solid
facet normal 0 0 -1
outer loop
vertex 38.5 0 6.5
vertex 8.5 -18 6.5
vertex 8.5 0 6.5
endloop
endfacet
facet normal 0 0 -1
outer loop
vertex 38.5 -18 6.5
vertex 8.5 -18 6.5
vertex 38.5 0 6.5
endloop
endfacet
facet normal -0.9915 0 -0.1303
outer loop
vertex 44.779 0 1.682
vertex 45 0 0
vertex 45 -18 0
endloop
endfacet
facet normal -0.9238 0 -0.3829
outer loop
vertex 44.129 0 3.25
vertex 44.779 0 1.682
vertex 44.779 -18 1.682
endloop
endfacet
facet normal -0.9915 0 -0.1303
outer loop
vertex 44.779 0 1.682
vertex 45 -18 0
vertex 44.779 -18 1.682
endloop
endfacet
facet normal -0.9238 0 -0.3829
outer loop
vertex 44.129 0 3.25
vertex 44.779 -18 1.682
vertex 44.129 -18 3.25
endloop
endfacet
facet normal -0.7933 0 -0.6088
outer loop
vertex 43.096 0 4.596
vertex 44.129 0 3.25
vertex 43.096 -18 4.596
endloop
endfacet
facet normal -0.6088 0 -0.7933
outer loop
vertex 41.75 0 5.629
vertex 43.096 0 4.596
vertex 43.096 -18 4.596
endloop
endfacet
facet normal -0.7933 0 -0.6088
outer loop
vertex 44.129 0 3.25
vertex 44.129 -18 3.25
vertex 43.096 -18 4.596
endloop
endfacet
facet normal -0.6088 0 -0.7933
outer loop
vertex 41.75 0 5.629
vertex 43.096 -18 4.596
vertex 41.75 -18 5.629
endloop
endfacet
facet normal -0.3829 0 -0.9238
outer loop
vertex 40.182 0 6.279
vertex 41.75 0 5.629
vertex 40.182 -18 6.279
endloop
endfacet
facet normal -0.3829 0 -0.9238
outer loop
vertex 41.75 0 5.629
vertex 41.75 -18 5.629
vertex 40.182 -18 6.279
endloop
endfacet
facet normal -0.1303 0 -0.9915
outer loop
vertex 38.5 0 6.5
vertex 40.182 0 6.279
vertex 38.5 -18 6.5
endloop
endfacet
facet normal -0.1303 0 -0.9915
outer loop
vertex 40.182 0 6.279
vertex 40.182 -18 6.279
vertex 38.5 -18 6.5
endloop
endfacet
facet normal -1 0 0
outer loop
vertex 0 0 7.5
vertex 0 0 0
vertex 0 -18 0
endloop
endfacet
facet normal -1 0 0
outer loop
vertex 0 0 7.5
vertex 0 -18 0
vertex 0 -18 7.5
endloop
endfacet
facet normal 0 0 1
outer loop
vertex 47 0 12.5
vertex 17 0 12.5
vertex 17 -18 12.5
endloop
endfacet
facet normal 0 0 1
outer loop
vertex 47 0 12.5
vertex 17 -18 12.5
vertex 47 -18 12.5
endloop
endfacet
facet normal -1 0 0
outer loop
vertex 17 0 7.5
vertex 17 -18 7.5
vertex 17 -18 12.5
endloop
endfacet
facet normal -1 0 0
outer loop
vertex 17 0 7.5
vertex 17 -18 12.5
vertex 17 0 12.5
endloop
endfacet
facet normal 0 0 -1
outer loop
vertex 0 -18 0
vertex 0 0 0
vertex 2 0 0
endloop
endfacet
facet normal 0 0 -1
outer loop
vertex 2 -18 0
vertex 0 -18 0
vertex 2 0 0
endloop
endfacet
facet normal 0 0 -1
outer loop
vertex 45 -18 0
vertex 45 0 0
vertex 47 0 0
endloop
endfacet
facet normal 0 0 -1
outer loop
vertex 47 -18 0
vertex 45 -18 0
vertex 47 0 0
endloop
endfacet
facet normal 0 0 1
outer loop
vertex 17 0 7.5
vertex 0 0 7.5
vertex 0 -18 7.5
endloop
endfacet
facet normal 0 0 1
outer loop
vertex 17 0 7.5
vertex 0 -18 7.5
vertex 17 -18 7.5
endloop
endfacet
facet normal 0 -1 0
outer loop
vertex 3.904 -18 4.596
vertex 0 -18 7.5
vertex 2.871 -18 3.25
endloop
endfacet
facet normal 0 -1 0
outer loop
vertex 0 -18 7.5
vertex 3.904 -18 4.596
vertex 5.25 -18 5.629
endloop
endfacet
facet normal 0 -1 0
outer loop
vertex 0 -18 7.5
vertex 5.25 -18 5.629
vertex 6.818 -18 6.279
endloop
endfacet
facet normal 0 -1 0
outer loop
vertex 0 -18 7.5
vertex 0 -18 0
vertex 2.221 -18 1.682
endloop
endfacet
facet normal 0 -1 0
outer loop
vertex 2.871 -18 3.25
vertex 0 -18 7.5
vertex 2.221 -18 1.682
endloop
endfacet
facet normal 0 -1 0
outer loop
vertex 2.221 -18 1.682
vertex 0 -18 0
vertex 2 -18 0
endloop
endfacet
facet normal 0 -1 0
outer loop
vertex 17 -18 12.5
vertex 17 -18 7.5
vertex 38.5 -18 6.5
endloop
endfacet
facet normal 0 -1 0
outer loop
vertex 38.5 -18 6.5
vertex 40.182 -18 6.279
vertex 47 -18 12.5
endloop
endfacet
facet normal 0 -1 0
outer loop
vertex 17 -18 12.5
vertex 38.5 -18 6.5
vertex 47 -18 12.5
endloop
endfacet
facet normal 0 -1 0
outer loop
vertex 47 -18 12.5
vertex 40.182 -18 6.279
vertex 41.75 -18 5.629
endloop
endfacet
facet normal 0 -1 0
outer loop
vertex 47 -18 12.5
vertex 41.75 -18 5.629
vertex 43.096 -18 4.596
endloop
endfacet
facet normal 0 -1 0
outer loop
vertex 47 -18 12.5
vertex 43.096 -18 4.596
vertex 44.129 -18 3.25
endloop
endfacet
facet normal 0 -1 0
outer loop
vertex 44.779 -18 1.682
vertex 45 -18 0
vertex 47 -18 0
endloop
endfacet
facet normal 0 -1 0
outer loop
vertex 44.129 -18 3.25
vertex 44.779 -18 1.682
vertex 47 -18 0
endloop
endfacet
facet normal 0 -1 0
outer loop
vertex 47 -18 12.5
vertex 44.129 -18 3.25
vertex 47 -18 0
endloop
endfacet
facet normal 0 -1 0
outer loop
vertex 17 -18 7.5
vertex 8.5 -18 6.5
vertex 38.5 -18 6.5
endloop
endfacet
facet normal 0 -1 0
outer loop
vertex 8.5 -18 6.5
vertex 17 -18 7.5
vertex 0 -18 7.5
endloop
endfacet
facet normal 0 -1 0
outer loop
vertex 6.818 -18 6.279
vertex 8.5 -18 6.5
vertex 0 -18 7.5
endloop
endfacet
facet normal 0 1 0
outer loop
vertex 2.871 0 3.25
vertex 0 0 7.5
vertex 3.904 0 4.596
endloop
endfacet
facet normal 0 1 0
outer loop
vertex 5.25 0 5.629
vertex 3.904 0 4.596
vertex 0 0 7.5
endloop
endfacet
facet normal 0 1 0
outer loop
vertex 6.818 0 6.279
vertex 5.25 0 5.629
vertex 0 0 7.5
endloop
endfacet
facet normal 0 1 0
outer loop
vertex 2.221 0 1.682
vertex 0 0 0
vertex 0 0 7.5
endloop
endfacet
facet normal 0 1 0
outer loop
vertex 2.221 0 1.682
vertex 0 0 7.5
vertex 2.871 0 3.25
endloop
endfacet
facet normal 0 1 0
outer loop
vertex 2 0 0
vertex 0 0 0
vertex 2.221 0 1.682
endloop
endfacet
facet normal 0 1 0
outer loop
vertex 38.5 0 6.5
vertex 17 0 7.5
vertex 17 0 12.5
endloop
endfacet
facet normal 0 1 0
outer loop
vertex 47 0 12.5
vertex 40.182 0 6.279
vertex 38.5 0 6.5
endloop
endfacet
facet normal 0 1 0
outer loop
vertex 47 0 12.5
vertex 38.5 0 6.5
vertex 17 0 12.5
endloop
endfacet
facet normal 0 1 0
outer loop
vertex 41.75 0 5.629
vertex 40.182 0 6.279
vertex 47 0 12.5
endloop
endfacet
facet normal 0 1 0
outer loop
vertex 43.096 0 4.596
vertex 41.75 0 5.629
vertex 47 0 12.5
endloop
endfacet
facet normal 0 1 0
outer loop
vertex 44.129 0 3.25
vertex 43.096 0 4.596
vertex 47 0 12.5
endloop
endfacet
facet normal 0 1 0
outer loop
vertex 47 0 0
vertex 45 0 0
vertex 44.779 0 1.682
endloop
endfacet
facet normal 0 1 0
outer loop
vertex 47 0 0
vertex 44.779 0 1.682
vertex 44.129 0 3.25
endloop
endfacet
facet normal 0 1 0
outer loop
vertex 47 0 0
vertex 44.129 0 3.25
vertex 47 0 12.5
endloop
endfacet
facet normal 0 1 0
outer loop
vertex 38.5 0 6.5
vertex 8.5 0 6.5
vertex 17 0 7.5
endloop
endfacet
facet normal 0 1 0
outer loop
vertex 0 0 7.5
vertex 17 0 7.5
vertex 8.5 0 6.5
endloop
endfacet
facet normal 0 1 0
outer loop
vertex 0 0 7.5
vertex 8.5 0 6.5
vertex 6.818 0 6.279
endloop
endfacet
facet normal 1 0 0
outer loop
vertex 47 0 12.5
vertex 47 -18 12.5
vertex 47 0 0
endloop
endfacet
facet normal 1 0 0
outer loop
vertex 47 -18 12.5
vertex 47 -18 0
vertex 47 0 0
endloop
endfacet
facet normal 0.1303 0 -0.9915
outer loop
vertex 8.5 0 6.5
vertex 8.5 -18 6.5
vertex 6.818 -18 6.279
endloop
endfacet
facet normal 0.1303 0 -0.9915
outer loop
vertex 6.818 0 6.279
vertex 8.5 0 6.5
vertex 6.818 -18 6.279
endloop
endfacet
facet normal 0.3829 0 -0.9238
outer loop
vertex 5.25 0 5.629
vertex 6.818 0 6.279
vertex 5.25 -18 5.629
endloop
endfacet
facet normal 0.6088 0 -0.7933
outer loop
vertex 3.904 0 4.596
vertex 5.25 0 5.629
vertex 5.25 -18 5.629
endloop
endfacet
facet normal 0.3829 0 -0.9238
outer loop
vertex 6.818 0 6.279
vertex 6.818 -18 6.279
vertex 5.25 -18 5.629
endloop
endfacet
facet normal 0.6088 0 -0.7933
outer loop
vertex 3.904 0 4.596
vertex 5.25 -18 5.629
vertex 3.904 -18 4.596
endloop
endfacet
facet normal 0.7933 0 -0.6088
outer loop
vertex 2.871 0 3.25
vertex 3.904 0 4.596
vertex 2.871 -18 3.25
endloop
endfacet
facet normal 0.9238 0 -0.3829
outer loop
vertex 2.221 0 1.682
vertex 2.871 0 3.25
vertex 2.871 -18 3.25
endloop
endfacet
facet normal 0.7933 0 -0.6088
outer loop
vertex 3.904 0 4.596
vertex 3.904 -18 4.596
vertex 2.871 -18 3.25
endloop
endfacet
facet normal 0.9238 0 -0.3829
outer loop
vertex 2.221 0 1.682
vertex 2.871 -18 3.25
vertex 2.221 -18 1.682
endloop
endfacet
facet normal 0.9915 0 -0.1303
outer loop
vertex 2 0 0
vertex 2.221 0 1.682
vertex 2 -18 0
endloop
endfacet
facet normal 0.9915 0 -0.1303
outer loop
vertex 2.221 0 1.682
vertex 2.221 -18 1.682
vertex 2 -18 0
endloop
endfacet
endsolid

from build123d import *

# Parameters (mm, degrees)
F0_W     = 47
F0_H     = 7.5
F1_DEPTH = 18
F2_W     = 30
F2_H     = 6.5
F3_DEPTH = 25
F4_R     = 6.5
F5_DEPTH = 25
F6_R     = 6.5
F7_DEPTH = 25
F8_W     = 30
F8_H     = 18
F9_DEPTH = 5


with BuildPart() as f1:
    # F0 (on Front) → F1 (new body)
    with BuildSketch(Plane.XZ):
        with Locations((23.5, 3.75)):
            Rectangle(F0_W, F0_H)
    extrude(amount=F1_DEPTH)

    # F2 (on face) → F3 (cut)
    with BuildSketch(Plane.XZ.offset(18)):
        with Locations((23.5, 3.25)):
            Rectangle(F2_W, F2_H)
    extrude(amount=-F3_DEPTH, mode=Mode.SUBTRACT)

    # F4 (on face) → F5 (cut)
    with BuildSketch(Plane.XZ.offset(18)):
        with Locations((8.5, 0)):
            Circle(F4_R)
    extrude(amount=-F5_DEPTH, mode=Mode.SUBTRACT)

    # F6 (on face) → F7 (cut)
    with BuildSketch(Plane.XZ.offset(18)):
        with Locations((38.5, 0)):
            Circle(F6_R)
    extrude(amount=-F7_DEPTH, mode=Mode.SUBTRACT)

    # F8 (on face) → F9 (join)
    with BuildSketch(Plane.XY.offset(7.5)):
        with Locations((32, -9)):
            Rectangle(F8_W, F8_H)
    extrude(amount=F9_DEPTH)


solid = f1.part
